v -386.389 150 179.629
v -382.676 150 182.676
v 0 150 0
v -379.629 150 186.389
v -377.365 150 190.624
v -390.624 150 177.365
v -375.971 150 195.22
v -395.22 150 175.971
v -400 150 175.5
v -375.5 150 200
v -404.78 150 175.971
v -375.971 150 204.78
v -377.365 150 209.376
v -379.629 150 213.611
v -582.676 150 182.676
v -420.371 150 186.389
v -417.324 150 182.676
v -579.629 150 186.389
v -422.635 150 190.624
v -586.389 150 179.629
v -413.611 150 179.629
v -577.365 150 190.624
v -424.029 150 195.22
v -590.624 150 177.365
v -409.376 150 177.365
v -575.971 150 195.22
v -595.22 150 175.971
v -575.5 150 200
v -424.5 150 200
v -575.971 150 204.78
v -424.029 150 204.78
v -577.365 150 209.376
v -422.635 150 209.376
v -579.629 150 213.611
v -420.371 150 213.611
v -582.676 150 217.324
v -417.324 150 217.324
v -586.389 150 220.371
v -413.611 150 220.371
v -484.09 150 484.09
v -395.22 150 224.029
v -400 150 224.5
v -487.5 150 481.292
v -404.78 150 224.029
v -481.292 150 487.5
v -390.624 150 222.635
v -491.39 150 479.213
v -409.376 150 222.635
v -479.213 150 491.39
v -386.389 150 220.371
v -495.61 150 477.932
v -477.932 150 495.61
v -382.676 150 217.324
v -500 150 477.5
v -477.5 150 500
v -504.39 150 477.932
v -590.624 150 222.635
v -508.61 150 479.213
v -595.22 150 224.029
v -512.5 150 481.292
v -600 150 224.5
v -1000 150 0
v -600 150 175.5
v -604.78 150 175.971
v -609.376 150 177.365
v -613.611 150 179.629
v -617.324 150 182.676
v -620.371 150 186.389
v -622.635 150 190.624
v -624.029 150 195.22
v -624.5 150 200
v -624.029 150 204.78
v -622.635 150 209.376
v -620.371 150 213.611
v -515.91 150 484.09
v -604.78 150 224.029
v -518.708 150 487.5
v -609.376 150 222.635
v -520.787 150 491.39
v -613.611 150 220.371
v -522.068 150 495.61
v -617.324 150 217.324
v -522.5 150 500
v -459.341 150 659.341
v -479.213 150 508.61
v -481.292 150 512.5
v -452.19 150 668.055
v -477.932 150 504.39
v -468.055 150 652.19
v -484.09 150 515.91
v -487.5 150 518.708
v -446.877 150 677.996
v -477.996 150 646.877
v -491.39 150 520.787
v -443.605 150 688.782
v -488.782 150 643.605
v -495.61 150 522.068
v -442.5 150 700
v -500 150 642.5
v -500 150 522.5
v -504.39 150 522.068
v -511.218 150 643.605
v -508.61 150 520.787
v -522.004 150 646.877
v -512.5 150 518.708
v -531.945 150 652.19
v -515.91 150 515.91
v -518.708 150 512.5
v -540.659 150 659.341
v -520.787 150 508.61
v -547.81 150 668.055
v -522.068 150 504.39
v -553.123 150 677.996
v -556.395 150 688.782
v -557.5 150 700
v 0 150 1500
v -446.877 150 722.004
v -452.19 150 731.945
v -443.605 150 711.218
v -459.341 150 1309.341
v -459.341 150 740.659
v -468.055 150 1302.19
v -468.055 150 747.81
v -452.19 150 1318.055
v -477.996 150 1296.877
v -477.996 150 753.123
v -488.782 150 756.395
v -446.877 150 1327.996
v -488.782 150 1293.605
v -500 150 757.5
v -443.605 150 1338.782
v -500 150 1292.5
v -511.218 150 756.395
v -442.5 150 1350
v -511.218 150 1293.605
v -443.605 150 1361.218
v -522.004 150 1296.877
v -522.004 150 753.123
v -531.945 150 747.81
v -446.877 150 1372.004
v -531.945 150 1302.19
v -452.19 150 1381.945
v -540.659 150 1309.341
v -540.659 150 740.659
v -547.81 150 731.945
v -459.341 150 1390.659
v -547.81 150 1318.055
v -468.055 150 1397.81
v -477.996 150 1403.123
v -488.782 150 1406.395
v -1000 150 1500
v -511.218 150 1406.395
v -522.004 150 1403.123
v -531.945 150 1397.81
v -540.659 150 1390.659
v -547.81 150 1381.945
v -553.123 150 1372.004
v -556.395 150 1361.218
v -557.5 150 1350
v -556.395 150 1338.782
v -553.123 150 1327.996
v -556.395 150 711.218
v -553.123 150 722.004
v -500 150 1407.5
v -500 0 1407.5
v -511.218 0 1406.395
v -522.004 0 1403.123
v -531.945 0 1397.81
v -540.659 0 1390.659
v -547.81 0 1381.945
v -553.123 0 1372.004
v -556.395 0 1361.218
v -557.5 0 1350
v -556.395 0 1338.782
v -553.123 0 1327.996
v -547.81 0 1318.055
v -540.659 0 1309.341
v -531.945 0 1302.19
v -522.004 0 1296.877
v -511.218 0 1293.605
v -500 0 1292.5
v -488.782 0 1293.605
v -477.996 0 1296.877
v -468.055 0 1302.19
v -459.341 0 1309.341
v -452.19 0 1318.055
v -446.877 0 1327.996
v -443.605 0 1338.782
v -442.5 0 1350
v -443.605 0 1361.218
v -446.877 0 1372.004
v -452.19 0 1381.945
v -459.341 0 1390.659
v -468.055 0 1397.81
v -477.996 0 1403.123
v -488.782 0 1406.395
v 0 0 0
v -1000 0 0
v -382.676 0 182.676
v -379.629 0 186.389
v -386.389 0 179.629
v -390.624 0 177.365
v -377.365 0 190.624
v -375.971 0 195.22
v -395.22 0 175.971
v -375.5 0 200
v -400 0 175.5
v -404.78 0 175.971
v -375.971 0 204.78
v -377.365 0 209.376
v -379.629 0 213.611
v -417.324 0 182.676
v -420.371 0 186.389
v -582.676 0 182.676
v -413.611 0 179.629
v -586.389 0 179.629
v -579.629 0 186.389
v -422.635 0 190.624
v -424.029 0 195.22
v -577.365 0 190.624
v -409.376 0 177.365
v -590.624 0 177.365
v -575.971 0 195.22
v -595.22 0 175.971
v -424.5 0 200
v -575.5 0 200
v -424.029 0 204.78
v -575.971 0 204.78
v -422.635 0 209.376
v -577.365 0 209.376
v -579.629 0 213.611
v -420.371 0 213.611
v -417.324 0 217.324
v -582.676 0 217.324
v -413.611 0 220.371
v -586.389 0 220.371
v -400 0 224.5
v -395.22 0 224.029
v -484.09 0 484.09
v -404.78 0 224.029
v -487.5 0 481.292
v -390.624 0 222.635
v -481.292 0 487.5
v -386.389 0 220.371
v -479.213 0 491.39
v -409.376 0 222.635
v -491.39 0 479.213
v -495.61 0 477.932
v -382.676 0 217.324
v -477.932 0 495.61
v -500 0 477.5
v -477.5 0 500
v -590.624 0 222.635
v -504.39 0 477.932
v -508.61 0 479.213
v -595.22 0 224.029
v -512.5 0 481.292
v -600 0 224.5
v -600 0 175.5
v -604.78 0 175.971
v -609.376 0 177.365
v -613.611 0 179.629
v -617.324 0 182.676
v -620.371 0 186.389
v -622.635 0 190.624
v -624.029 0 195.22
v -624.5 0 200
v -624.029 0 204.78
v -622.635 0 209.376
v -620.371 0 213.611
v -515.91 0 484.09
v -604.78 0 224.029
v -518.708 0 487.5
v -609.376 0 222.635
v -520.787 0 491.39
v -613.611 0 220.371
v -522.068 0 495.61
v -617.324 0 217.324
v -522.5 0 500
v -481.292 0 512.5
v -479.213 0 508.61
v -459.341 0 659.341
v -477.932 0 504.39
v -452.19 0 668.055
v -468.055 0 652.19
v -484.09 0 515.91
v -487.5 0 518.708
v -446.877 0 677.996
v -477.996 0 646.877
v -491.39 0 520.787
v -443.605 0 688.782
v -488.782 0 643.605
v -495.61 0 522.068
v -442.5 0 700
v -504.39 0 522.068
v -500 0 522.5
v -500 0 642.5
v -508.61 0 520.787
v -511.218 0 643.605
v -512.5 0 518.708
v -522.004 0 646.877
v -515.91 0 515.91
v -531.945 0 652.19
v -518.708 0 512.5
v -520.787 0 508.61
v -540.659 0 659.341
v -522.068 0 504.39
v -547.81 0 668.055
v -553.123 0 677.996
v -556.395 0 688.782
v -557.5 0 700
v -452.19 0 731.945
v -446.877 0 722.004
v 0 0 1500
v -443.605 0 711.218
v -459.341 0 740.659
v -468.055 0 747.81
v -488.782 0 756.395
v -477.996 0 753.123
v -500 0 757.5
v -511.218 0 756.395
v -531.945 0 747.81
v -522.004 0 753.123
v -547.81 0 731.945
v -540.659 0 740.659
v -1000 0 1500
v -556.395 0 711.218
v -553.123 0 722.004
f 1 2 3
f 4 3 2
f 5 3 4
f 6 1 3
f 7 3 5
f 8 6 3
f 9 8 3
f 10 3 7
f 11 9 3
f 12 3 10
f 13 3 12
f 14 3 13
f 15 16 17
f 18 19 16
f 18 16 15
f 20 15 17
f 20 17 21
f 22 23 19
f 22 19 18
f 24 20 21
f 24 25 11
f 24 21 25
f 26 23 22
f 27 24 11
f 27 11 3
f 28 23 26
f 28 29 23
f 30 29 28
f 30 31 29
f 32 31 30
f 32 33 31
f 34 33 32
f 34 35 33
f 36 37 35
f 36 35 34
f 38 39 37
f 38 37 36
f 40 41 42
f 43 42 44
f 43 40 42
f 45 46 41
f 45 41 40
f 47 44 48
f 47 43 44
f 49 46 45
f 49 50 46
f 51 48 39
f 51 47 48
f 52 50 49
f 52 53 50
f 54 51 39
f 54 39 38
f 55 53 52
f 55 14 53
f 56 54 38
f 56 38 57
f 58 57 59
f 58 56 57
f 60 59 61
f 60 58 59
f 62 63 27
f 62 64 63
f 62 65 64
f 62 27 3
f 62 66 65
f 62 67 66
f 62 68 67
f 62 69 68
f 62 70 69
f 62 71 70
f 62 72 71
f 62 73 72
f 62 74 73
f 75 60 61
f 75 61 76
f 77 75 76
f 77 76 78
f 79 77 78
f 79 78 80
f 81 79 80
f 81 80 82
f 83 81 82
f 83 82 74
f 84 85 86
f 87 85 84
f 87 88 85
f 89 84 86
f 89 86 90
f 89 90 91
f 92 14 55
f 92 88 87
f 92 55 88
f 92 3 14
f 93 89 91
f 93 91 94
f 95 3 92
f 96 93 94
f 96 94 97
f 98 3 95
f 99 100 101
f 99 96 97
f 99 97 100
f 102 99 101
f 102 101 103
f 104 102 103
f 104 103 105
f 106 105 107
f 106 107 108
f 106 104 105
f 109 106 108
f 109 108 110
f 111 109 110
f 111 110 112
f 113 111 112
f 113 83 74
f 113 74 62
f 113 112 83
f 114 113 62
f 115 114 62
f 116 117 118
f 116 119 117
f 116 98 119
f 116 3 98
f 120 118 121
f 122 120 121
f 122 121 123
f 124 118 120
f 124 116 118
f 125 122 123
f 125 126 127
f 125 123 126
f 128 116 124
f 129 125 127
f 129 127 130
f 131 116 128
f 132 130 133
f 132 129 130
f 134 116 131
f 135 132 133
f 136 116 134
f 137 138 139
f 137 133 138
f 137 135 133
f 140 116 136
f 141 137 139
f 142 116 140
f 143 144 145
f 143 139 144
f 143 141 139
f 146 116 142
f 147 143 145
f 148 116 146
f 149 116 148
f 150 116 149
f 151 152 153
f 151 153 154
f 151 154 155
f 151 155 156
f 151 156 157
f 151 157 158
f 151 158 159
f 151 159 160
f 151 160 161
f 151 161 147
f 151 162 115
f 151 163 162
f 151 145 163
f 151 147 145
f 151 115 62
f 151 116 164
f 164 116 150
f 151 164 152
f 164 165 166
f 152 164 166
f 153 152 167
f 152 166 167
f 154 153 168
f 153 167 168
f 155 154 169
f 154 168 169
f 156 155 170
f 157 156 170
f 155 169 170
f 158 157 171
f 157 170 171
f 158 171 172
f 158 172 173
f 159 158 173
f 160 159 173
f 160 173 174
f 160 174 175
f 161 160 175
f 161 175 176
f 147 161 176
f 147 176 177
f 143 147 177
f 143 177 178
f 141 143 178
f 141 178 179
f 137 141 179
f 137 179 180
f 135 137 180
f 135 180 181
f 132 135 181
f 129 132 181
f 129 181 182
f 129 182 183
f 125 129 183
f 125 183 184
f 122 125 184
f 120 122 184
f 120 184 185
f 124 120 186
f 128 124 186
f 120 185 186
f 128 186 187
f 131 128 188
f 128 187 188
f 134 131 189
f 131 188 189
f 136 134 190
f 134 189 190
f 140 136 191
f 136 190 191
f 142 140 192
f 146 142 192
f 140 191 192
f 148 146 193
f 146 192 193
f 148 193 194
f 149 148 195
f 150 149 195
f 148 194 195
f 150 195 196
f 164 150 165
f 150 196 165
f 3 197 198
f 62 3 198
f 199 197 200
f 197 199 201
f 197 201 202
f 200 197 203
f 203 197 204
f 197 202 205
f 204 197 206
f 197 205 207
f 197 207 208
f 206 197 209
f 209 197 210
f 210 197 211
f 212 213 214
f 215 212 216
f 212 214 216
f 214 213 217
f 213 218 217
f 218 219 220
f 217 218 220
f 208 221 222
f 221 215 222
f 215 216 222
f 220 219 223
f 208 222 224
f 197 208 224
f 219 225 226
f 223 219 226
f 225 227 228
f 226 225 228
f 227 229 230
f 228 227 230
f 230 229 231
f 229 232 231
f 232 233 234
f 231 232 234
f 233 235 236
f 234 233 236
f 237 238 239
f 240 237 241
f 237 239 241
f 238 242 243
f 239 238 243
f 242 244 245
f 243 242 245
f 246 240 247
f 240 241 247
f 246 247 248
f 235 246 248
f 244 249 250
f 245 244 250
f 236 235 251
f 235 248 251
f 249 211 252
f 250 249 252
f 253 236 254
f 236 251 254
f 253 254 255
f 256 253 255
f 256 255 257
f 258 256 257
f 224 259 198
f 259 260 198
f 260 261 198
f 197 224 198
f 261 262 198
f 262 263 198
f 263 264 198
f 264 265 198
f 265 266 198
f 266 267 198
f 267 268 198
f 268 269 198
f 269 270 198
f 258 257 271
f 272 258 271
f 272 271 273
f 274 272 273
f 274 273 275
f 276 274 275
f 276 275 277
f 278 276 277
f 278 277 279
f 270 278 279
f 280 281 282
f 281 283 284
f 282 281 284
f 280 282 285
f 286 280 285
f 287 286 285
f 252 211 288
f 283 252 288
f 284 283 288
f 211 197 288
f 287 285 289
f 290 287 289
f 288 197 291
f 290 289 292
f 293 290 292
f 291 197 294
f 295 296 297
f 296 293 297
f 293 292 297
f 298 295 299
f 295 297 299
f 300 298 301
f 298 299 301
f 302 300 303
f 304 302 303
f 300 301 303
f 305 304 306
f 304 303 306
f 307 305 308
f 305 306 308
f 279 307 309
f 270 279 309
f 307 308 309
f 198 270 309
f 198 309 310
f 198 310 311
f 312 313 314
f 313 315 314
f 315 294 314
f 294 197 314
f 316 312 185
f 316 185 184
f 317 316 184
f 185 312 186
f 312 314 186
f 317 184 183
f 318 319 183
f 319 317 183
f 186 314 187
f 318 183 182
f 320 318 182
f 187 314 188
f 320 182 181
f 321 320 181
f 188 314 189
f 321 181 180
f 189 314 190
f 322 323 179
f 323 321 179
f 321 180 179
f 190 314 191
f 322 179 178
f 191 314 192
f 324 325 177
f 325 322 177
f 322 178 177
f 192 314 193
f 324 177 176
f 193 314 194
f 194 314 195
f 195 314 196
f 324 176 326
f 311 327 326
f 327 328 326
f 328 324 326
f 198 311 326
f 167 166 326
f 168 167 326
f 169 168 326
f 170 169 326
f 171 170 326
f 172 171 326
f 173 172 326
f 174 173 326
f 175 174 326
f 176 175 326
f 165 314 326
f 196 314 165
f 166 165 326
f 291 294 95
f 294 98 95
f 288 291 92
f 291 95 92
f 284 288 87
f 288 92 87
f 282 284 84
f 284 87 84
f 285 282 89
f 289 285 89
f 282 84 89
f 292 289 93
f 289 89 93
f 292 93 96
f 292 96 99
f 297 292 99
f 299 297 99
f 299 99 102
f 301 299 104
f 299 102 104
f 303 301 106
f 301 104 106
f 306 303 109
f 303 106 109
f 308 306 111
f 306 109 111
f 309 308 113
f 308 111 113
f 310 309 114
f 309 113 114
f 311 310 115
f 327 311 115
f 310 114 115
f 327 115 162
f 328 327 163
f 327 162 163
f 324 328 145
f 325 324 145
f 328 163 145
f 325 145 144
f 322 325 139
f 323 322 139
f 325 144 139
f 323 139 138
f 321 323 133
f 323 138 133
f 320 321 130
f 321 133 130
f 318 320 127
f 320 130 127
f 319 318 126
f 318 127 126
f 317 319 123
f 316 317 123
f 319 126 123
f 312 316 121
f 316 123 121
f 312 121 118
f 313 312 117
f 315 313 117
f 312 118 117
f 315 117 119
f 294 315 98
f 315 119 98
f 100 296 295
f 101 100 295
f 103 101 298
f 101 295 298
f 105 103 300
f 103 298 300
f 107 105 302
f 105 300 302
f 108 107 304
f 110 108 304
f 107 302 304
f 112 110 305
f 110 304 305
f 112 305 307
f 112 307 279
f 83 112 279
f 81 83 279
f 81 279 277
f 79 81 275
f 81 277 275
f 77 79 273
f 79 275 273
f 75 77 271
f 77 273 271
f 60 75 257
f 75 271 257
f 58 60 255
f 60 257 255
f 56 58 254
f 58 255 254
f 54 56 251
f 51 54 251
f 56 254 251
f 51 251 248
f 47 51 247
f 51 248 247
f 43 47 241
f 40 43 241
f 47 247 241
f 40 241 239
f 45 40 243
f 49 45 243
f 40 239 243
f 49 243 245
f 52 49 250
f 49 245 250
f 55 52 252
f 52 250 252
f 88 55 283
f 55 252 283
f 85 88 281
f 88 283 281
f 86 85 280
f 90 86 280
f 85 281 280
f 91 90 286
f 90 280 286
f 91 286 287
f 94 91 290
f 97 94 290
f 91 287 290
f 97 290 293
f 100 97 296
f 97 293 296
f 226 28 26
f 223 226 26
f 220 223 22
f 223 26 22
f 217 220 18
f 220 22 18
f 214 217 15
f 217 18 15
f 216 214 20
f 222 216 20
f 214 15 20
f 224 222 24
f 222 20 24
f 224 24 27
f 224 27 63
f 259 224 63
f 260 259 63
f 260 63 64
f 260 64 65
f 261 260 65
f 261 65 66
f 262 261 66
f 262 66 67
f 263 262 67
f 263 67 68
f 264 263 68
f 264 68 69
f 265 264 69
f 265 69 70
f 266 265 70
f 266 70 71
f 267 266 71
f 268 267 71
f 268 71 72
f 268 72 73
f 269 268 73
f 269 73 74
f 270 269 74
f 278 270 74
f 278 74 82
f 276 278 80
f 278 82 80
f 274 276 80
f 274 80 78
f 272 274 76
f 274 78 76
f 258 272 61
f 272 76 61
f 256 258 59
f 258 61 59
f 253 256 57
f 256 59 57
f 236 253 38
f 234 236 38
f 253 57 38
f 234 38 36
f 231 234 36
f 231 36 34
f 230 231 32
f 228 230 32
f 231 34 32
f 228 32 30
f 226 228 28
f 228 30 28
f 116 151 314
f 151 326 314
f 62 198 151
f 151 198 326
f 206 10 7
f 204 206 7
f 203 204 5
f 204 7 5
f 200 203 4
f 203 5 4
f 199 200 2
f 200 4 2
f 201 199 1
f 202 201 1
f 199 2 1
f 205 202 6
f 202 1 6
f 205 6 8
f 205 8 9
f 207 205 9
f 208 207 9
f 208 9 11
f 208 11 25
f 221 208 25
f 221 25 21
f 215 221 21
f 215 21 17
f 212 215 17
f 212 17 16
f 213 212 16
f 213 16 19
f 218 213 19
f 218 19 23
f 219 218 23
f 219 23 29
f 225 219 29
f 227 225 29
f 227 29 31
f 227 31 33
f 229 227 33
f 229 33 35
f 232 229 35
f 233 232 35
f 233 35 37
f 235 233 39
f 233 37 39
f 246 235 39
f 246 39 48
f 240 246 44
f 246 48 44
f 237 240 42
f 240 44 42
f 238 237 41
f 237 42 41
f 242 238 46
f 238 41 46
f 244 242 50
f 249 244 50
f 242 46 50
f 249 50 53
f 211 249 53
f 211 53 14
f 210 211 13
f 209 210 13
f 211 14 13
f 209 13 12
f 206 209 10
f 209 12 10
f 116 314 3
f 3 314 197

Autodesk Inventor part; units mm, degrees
ref_plane "YZ Plane" through (0, 0, 0) normal (1, 0, 0) x (0, 1, 0)
ref_plane "XZ Plane" through (0, 0, 0) normal (0, 1, 0) x (-1, 0, 0)
ref_plane "XY Plane" through (0, 0, 0) normal (0, 0, 1) x (1, 0, 0)
sketch "Sketch1" plane through (0, 0, 0) normal (0, 1, 0) x (-1, 0, 0)
  line L0 (0, 0) -> (1000, 0)
  line L1 (1000, 0) -> (1000, 1500)
  line L2 (1000, 1500) -> (0, 1500)
  line L3 (0, 1500) -> (0, 0)
  dimension "d0" = 1000
  dimension "d1" = 1500
extrude "base" add sketch "Sketch1" along normal blind 150
sketch "Sketch2" plane through (0, 150, 0) normal (0, 1, 0) x (1, 0, 0)
  circle A0 centre (-500, -700) radius 57.5
  line L0 (0, 0) -> (-1000, 0) projected
  line L1 (-1000, -1500) -> (0, -1500) projected
  line L2 (-500, 0) -> (-500, -1500) construction
  dimension "d4" = 115
  dimension "d38" = 700
extrude "air" cut sketch "Sketch2" against normal through all
sketch "Sketch3" plane through (0, 150, 0) normal (0, 1, 0) x (1, 0, 0)
  circle A0 centre (-500, -700) radius 57.5 projected
  circle A1 centre (-400, -200) radius 24.5
  circle A2 centre (-600, -200) radius 24.5
  line L0 (0, 0) -> (-1000, 0) projected
  dimension "d7" = 49
  dimension "d40" = 100
  dimension "d41" = 49
  dimension "d42" = 100
  dimension "d55" = 200
extrude "power" cut sketch "Sketch3" against normal blind 254 contours A1 | A2
sketch "Sketch4" plane through (0, 150, 0) normal (0, 1, 0) x (1, 0, 0)
  circle A0 centre (-600, -200) radius 24.5 projected
  circle A1 centre (-500, -500) radius 24.5
  line L0 (0, 0) -> (-1000, 0) projected
  dimension "d52" = 49
  dimension "d53" = 500
hole "fibre" at (-500, 150, 500) direction (0, -1, 0) diameter 45 end through all
sketch "Sketch6" plane through (0, 150, 0) normal (0, 1, 0) x (1, 0, 0)
  circle A0 centre (-500, -700) radius 57.5 projected
  circle A1 centre (-500, -1350) radius 76.2
  dimension "d29" = 152.4
  dimension "d30" = 650
hole "air2" at (-500, 150, 1350) direction (0, -1, 0) diameter 115 end through all
properties part number "plinth" material "Concrete"
